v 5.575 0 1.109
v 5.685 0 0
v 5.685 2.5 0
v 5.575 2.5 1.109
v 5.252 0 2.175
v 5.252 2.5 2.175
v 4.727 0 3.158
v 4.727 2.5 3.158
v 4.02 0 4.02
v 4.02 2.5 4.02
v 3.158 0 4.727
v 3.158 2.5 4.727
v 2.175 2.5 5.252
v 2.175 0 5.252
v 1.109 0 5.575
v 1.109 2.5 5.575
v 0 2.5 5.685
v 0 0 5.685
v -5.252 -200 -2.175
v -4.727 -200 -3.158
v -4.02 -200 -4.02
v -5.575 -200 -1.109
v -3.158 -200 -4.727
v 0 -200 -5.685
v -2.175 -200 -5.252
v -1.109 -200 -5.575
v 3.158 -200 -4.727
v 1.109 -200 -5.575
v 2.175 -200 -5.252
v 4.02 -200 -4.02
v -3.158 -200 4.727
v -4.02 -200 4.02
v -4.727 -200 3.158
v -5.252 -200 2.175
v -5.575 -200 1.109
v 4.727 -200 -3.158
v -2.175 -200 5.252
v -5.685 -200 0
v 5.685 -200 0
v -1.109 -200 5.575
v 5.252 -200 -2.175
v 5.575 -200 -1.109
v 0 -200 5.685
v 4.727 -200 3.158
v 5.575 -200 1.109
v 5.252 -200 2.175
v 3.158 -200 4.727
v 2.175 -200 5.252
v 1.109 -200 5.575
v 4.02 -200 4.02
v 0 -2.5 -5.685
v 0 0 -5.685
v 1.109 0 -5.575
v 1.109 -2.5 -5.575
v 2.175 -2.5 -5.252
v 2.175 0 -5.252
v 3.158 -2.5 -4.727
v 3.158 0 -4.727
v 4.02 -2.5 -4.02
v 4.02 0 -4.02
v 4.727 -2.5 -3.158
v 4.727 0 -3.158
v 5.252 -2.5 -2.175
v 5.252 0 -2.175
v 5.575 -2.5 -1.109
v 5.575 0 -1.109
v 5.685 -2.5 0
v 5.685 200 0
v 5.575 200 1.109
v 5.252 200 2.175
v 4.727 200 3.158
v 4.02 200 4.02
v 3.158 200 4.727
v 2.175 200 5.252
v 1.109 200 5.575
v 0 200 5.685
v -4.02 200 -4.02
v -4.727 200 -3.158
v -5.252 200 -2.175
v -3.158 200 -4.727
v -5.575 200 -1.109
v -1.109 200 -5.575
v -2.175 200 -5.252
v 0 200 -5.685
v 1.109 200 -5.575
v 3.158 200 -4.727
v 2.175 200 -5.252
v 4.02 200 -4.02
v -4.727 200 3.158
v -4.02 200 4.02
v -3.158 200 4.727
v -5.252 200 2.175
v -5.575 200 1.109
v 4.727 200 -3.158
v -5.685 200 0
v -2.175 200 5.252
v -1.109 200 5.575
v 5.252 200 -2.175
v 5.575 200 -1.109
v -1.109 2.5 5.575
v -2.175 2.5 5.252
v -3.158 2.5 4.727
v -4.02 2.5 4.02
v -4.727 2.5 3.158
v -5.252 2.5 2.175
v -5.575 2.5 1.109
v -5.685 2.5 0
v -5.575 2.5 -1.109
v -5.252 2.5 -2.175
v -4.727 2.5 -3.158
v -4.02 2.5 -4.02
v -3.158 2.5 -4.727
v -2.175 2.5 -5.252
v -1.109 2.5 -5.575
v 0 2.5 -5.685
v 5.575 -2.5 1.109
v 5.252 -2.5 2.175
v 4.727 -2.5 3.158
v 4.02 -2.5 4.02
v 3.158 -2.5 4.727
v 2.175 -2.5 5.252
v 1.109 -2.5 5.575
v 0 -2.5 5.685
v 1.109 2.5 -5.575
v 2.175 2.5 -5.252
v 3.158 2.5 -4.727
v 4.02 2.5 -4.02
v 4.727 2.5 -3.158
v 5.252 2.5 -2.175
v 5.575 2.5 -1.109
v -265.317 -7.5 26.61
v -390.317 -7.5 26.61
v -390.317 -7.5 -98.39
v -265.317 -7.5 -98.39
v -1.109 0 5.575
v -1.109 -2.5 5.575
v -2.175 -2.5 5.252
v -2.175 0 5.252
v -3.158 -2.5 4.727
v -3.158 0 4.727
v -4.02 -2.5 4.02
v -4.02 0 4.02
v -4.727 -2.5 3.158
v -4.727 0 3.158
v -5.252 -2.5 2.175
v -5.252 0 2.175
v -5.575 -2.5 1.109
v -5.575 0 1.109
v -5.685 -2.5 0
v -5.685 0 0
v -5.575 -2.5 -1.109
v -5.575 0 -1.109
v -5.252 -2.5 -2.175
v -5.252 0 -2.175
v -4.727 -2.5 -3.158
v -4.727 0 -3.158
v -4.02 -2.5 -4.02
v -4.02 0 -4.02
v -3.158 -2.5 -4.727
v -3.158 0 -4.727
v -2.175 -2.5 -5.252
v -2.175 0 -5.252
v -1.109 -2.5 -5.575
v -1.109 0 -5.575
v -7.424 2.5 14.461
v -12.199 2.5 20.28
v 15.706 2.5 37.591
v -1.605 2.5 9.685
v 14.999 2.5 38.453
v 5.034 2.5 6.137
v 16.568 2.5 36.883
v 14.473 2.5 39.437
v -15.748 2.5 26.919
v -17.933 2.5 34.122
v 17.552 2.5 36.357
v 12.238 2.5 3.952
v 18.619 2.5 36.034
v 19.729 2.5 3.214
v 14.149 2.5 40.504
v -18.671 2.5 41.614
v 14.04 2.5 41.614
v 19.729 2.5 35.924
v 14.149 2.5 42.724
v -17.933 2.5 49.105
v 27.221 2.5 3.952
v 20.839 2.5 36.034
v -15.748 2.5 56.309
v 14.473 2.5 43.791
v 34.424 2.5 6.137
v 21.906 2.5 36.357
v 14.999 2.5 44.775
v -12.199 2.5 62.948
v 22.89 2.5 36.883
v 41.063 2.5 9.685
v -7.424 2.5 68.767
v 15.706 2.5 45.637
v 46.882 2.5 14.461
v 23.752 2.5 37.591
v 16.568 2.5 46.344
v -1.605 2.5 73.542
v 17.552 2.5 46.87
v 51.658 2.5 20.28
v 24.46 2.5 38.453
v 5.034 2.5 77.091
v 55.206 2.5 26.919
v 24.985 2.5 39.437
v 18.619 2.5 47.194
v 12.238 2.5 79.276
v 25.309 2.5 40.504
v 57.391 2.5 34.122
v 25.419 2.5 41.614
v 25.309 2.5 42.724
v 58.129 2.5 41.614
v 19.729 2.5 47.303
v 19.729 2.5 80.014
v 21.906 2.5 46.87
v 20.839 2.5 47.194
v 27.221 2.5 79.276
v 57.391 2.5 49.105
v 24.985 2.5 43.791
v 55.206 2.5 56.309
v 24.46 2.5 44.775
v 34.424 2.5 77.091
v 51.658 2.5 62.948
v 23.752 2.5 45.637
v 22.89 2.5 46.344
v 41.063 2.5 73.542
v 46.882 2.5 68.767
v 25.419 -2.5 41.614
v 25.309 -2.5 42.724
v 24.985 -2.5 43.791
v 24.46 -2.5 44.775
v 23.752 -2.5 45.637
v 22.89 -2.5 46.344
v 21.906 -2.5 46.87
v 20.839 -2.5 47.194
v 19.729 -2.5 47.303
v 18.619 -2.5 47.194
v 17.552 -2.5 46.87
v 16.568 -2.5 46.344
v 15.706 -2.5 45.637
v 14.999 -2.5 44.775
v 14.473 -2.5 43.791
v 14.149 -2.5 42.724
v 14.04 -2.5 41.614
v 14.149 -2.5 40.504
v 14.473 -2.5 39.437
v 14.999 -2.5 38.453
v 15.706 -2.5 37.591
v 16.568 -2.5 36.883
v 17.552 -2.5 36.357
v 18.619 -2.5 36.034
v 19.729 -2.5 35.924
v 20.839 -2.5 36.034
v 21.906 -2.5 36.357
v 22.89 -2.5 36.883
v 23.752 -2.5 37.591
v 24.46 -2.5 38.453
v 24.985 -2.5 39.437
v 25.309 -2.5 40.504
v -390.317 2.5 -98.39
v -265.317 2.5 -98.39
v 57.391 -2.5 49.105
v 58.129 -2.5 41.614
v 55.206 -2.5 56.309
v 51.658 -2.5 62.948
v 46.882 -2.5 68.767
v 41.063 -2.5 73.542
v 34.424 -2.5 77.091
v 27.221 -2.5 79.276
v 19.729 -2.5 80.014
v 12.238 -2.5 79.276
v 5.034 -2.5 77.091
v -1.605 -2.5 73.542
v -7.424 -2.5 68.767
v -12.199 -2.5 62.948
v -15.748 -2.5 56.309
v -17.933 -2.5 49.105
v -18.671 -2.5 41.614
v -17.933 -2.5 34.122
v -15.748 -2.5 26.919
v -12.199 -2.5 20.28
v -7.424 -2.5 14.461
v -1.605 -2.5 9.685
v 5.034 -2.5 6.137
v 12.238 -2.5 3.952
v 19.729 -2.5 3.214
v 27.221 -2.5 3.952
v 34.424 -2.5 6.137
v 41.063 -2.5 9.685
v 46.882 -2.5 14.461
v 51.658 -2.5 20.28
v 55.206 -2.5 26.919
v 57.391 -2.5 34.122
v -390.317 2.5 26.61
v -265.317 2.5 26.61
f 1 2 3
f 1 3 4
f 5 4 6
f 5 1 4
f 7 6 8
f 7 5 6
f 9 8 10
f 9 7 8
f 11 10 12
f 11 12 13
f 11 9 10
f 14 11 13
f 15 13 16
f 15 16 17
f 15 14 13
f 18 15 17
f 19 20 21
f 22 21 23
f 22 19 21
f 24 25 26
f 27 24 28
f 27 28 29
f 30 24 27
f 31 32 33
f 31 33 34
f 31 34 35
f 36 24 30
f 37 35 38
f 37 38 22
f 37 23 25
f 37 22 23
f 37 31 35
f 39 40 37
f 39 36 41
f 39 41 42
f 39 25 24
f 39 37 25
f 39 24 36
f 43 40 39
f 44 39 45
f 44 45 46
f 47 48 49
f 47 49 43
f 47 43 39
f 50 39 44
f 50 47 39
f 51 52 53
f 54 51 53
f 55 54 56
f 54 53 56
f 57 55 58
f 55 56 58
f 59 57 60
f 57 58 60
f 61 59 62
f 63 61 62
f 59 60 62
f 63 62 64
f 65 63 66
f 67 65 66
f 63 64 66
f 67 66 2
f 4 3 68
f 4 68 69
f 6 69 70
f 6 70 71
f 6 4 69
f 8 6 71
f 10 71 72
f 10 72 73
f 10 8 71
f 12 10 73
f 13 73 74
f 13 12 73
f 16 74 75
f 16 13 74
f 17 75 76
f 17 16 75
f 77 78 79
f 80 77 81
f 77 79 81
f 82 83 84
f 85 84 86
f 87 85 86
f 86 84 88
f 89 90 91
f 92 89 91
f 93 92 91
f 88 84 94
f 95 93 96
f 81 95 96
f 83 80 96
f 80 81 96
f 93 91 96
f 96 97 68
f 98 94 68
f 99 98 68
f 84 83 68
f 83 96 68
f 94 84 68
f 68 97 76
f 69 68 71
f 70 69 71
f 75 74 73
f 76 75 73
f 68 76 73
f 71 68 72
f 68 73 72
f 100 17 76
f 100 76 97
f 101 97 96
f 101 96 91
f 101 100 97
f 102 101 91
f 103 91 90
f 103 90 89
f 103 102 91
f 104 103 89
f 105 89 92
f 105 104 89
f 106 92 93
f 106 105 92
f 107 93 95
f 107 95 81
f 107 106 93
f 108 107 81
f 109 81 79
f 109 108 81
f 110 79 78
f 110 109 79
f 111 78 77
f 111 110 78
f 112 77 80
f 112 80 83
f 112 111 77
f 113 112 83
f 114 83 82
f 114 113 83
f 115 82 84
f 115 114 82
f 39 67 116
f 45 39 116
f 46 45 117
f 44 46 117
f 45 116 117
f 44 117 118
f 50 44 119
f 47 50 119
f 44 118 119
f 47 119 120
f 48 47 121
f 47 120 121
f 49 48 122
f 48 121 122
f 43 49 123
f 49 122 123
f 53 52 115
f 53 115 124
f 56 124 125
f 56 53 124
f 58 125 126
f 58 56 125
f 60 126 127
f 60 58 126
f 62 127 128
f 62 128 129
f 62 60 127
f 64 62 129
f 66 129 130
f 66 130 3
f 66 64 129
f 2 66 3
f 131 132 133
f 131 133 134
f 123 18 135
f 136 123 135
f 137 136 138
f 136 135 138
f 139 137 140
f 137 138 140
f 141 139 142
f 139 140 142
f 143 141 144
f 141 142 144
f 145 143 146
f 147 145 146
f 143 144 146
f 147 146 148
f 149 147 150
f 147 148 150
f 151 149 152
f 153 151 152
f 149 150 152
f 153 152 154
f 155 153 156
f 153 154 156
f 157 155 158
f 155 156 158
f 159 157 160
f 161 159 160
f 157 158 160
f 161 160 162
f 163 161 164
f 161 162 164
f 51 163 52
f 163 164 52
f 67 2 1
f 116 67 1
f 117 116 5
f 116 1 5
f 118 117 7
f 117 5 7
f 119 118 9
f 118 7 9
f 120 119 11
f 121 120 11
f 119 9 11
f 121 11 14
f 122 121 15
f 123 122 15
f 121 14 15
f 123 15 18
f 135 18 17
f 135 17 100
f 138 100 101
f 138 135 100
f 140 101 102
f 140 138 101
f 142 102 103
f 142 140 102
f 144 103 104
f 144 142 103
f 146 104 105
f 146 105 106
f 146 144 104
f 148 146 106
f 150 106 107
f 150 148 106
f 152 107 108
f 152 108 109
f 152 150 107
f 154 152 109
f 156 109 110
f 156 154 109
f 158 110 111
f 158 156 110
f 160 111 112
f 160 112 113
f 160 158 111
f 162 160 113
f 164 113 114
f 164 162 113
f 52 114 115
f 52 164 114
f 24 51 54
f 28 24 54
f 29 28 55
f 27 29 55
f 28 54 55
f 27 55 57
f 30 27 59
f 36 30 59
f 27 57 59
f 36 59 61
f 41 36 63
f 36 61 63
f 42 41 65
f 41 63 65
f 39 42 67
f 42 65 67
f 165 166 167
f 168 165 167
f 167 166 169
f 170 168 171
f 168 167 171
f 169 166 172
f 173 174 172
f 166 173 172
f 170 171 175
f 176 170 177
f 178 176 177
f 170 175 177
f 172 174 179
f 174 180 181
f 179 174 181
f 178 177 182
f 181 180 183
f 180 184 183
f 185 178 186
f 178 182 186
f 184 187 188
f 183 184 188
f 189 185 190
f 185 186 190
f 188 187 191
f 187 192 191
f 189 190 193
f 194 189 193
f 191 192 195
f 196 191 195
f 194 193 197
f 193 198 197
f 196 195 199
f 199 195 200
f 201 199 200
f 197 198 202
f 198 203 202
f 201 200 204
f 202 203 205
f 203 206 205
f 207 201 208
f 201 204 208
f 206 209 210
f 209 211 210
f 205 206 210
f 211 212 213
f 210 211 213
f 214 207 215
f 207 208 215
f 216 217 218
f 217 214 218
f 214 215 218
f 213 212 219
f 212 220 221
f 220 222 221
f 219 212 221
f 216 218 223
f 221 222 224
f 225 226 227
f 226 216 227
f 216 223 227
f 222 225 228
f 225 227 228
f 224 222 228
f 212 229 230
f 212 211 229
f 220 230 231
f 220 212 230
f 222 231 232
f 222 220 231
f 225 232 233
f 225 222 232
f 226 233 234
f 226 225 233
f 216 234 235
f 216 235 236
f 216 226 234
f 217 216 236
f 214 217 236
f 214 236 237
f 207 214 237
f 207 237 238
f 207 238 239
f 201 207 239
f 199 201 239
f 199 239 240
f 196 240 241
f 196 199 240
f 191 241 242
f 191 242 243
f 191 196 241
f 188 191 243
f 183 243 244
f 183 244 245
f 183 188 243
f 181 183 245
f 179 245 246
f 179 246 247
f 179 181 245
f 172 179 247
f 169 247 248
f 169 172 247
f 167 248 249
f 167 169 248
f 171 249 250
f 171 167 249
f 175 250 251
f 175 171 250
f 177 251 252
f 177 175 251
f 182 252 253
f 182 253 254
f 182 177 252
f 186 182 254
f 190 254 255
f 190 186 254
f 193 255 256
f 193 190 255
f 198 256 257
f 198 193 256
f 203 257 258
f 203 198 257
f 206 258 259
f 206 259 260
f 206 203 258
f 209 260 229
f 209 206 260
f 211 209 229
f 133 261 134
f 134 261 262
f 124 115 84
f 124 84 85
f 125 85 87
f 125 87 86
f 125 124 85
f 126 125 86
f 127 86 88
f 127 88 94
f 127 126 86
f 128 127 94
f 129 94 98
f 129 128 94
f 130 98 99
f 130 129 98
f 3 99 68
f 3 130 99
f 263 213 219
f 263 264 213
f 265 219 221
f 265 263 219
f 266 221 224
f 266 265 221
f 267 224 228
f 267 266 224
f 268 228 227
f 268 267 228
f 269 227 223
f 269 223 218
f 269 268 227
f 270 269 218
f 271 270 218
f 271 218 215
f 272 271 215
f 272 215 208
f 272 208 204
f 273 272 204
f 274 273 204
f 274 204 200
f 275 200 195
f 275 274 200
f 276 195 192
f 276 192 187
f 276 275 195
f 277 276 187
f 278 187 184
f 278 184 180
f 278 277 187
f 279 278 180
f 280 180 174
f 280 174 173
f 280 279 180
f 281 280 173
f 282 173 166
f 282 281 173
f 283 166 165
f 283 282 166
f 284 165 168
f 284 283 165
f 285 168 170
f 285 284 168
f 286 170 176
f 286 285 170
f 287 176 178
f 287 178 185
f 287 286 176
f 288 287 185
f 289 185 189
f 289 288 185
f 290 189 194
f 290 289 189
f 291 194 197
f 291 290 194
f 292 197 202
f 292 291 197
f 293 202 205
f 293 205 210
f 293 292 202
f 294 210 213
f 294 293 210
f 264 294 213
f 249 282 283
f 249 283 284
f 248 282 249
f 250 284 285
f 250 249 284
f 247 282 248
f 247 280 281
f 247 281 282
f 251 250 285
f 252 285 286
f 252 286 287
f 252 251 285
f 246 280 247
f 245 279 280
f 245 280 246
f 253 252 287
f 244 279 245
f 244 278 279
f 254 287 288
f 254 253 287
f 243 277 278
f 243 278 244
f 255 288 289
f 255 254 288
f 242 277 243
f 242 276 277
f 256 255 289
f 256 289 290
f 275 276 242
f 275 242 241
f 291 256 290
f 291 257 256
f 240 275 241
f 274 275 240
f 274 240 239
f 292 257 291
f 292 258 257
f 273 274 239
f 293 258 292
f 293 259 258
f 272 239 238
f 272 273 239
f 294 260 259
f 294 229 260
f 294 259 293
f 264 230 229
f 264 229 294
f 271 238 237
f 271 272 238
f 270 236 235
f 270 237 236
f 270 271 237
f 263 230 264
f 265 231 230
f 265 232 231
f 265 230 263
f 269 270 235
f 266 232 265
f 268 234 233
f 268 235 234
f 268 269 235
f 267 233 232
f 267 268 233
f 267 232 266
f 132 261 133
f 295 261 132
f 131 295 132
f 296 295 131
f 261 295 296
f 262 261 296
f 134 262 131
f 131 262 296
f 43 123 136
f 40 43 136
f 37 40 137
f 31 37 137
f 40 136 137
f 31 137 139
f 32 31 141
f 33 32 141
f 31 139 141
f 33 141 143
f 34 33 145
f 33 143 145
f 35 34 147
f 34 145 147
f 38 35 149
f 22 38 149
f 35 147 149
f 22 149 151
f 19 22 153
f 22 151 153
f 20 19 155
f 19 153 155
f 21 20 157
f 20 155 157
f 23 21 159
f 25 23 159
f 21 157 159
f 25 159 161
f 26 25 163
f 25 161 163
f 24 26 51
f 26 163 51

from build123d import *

# Parameters (mm, degrees)
F1_DEPTH = 200
F2_DEPTH = 2.5
F0_W     = 125
F0_H     = 125
F0_R     = 38.4
F0_R_2   = 5.6893998614
F3_DEPTH = 5


with BuildPart() as f1:
    # F0 (on Front) → F1 (new body, symmetric)
    with BuildSketch(Plane.XZ):
        with BuildLine():
            Line((0, -5.6846067522), (0, 5.6846067522))
            ThreePointArc((0, 5.6846067522), (-5.6846067522, 0), (0, -5.6846067522))
        make_face()
        with BuildLine():
            ThreePointArc((0, -5.6846067522), (4.0196239829, -4.0196239829), (5.6846067522, 0))
            ThreePointArc((5.6846067522, 0), (4.0196239829, 4.0196239829), (0, 5.6846067522))
            Line((0, 5.6846067522), (0, -5.6846067522))
        make_face()
    extrude(amount=F1_DEPTH, both=True)

    # F0 (on Front) → F2 (join, symmetric)
    with BuildSketch(Plane.XZ):
        with BuildLine():
            ThreePointArc((0, -5.6846067522), (4.0196239829, -4.0196239829), (5.6846067522, 0))
            ThreePointArc((5.6846067522, 0), (4.0196239829, 4.0196239829), (0, 5.6846067522))
            Line((0, 5.6846067522), (0, -5.6846067522))
        make_face()
        with BuildLine():
            Line((0, -5.6846067522), (0, 5.6846067522))
            ThreePointArc((0, 5.6846067522), (-5.6846067522, 0), (0, -5.6846067522))
        make_face()
    extrude(amount=F2_DEPTH, both=True)


with BuildPart() as f2:
    # F0 (on Front) → F2, piece 2 (new body, symmetric)
    with BuildSketch(Plane.XZ):
        with Locations((-327.8169184923, -35.8895286918)):
            Rectangle(F0_W, F0_H)
    extrude(amount=F2_DEPTH, both=True)

    # F3 (add): a face of the model
    f3_faces = [f2.faces().sort_by_distance(p)[0] for p in [
        (-327.8169184923, -2.5, -35.8895286918),
    ]]
    extrude(f3_faces, amount=F3_DEPTH)


with BuildPart() as f2b:
    # F0 (on Front) → F2, piece 3 (new body, symmetric)
    with BuildSketch(Plane.XZ):
        with Locations((19.7291626689, 41.6138138982)):
            Circle(F0_R)
        with Locations((19.7291626689, 41.6138138982)):
            Circle(F0_R_2, mode=Mode.SUBTRACT)
    extrude(amount=F2_DEPTH, both=True)


solid = Compound([f1.part, f2.part, f2b.part])
